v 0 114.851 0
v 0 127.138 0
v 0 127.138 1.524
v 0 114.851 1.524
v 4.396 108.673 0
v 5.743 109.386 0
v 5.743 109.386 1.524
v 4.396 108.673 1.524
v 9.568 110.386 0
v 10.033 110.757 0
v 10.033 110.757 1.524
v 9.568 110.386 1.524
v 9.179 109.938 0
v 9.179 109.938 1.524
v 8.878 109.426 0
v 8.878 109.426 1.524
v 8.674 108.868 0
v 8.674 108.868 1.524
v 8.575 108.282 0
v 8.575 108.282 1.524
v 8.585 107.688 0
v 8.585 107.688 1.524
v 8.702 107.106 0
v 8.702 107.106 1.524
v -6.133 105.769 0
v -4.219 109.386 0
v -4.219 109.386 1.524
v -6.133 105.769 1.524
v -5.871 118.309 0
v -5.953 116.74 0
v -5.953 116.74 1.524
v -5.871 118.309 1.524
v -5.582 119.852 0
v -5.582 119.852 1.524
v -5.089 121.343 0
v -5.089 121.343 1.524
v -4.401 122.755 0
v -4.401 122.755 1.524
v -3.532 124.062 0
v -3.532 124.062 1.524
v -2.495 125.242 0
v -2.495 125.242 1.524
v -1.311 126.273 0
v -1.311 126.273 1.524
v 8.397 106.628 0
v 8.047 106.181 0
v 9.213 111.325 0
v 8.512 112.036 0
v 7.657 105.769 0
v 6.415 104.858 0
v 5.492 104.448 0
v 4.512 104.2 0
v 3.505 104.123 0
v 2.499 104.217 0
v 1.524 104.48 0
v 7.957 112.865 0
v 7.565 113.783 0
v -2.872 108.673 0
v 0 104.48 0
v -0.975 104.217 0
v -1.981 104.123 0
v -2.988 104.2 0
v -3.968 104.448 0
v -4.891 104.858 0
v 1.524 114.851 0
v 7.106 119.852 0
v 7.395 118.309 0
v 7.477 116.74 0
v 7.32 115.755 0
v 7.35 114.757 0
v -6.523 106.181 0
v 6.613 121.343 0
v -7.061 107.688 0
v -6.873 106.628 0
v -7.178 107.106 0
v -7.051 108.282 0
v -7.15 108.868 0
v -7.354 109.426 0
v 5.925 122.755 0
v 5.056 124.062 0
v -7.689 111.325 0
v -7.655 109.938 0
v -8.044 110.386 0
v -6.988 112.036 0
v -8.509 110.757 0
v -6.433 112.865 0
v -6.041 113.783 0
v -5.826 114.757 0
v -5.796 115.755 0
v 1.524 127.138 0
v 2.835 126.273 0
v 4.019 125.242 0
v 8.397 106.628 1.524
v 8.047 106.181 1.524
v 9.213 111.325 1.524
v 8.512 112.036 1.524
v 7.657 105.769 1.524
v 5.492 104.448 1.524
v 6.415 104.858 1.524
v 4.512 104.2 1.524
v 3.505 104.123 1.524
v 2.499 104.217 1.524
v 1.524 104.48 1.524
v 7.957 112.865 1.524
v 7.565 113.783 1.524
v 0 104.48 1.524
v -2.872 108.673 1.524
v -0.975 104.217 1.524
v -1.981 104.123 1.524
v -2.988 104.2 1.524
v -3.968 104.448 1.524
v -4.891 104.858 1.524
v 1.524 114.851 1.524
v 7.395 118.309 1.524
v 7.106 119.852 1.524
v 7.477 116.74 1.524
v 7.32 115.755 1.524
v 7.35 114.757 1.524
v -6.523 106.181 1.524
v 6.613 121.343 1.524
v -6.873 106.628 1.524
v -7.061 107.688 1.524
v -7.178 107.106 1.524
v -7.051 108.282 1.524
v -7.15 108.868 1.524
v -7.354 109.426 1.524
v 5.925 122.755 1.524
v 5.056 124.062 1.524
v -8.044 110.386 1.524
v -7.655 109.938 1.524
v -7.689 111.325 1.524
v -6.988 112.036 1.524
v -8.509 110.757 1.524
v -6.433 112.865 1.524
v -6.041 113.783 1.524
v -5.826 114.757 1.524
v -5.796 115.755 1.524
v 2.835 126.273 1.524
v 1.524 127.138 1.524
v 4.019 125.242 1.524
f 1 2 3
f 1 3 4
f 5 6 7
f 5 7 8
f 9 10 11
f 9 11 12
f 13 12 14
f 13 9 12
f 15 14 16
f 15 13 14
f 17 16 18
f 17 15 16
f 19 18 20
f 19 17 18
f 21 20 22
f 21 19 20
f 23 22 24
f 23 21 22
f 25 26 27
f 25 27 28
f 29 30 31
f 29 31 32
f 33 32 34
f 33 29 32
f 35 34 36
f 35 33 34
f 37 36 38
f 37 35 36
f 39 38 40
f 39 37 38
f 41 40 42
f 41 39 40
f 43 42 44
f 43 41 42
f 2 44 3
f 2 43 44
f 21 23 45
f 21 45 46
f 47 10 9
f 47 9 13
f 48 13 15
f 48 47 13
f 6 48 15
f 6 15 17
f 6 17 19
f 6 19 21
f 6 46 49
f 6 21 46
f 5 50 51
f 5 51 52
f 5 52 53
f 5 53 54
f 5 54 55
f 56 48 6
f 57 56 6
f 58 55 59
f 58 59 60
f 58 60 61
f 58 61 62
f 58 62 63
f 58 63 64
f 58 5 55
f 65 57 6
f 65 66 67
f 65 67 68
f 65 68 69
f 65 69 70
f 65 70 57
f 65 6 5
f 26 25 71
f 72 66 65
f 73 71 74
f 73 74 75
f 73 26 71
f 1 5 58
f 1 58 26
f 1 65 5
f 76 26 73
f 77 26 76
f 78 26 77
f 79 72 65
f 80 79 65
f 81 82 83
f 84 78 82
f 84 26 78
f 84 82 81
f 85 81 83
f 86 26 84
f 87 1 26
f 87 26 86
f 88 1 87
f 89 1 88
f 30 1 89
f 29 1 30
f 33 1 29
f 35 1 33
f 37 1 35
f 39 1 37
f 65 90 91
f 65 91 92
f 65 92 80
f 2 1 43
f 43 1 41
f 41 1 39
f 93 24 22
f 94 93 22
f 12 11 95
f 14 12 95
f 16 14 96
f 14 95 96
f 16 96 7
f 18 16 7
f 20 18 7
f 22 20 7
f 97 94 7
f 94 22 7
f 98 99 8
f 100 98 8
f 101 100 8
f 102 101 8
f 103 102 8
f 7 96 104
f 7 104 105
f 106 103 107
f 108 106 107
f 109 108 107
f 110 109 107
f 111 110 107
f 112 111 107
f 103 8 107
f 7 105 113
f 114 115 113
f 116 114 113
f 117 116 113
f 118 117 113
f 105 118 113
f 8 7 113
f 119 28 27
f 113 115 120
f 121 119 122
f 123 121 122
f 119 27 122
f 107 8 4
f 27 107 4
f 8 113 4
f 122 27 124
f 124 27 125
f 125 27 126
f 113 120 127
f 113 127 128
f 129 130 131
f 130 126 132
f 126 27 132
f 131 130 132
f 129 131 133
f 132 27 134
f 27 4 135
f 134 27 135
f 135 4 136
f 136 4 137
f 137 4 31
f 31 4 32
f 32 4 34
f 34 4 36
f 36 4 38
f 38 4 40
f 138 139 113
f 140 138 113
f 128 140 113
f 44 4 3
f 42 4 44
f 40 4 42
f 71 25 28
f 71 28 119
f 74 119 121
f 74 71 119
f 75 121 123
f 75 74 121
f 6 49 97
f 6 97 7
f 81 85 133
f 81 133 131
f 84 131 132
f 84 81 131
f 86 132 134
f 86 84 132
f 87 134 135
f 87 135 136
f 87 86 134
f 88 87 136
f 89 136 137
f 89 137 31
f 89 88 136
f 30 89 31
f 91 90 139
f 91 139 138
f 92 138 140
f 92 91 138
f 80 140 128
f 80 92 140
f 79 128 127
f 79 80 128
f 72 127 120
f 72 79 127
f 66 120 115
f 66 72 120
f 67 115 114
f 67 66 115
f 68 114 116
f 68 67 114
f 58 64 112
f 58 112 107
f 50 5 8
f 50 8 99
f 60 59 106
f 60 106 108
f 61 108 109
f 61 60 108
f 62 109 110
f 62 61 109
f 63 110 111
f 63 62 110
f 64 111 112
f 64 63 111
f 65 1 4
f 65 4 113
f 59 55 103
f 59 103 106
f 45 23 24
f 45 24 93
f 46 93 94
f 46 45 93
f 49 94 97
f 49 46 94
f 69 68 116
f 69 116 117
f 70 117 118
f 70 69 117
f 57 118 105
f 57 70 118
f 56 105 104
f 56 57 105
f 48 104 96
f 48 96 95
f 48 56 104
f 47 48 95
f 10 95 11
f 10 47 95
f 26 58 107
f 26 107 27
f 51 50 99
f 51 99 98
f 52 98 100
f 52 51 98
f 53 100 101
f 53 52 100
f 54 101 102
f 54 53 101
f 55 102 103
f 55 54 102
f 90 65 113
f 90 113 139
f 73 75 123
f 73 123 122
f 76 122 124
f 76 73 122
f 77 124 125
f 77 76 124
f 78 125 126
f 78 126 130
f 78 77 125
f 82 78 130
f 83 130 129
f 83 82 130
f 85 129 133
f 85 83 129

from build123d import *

# Parameters (mm, degrees)
BOSS_EXTRUDE1_DEPTH = 1.524


with BuildPart() as part:
    # Sketch1 → Boss-Extrude1 (new body)
    with BuildSketch(Plane.XY):
        with BuildLine():
            Line((0, 114.851197301), (1.524, 114.851197301))
            Line((1.524, 114.851197301), (1.524, 127.137521288))
            ThreePointArc((1.524, 127.137521288), (5.925149422, 122.754651777), (7.476746905, 116.740318344))
            ThreePointArc((7.476746905, 116.740318344), (7.739144324, 113.314611295), (10.032707403, 110.756508563))
            ThreePointArc((10.032707403, 110.756508563), (8.763036176, 109.151405897), (8.701919017, 107.105755809))
            ThreePointArc((8.701919017, 107.105755809), (8.227293035, 106.400067512), (7.656654449, 105.769482545))
            Line((7.656654449, 105.769482545), (5.742583542, 109.386323923))
            Line((5.742583542, 109.386323923), (4.395578742, 108.673474663))
            Line((4.395578742, 108.673474663), (6.414912826, 104.857727272))
            ThreePointArc((6.414912826, 104.857727272), (4.010280896, 104.139935188), (1.524, 104.480357725))
            Line((1.524, 104.480357725), (0, 104.480357725))
            ThreePointArc((0, 104.480357725), (-2.486280896, 104.139935188), (-4.890912826, 104.857727272))
            Line((-4.890912826, 104.857727272), (-2.871578742, 108.673474663))
            Line((-2.871578742, 108.673474663), (-4.218583542, 109.386323923))
            Line((-4.218583542, 109.386323923), (-6.132654449, 105.769482545))
            ThreePointArc((-6.132654449, 105.769482545), (-6.703293035, 106.400067512), (-7.177919017, 107.105755809))
            ThreePointArc((-7.177919017, 107.105755809), (-7.239036176, 109.151405897), (-8.508707403, 110.756508563))
            ThreePointArc((-8.508707403, 110.756508563), (-6.215144324, 113.314611295), (-5.952746905, 116.740318344))
            ThreePointArc((-5.952746905, 116.740318344), (-4.401149422, 122.754651777), (0, 127.137521288))
            Line((0, 127.137521288), (0, 114.851197301))
        make_face()
    extrude(amount=BOSS_EXTRUDE1_DEPTH)


solid = part.part
